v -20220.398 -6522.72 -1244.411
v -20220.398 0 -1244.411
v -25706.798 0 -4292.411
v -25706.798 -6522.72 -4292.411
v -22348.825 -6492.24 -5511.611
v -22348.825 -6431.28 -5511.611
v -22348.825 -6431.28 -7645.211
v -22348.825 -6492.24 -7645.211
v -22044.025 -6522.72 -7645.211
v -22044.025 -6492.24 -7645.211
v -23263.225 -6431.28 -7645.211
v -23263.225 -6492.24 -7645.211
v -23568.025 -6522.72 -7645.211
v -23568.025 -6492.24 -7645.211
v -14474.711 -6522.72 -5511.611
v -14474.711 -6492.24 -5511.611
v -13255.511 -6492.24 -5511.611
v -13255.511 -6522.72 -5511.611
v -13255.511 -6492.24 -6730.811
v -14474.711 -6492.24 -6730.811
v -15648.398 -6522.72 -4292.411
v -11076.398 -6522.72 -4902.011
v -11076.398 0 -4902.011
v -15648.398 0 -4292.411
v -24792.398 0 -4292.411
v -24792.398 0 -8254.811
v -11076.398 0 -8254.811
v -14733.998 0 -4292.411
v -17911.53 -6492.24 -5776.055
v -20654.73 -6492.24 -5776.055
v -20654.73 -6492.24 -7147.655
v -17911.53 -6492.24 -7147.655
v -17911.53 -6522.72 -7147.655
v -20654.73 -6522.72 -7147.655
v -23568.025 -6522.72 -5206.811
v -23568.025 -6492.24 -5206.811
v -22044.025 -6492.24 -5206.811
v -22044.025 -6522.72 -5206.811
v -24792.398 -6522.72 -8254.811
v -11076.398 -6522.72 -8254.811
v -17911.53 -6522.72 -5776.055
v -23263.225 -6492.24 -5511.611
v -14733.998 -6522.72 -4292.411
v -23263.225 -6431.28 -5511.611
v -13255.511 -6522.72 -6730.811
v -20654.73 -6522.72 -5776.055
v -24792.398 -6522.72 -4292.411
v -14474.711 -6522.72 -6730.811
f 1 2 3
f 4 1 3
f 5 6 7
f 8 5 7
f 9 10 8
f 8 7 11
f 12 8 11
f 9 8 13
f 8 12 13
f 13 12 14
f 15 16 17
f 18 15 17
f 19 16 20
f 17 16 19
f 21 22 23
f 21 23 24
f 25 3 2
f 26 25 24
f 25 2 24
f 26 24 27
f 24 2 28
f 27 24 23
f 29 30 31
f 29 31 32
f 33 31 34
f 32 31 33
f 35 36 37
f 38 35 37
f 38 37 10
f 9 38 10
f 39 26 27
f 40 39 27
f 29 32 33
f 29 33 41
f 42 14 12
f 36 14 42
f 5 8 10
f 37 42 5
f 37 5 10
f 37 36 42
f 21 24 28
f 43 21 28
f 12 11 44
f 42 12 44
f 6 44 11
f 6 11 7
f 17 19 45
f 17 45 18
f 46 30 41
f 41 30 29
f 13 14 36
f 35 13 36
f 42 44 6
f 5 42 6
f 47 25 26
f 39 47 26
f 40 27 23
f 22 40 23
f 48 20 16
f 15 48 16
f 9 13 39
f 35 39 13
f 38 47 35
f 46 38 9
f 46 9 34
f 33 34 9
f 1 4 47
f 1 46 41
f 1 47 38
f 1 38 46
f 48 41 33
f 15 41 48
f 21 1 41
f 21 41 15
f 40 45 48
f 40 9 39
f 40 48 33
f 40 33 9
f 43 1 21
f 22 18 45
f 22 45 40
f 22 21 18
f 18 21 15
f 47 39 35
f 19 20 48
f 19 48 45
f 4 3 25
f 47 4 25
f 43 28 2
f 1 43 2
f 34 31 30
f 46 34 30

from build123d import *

# Parameters (mm, degrees)
F0_W     = 4572
F0_H     = 609.6
F0_W_2   = 2743.2
F0_H_2   = 1371.6
F0_W_3   = 1219.2
F0_H_3   = 1219.2
F1_DEPTH = 6522.72
F0_W_4   = 914.4
F0_H_4   = 2133.6
F2_DEPTH = 6431.28
F3_DEPTH = 6492.24
F4_DEPTH = 6492.24
F5_DEPTH = 6492.24


with BuildPart() as f1:
    # F0 (on Front) → F1 (new body)
    with BuildSketch(Plane.XZ):
        Polygon((-24792.3976912726, -7645.2114713722), (-24792.3976912726, -8254.8114713722), (-15648.3976912726, -8254.8114713722), (-15648.3976912726, -7645.2114713722), (-22044.0248364636, -7645.2114713722), (-22348.8248364636, -7645.2114713722), (-23263.2248364636, -7645.2114713722), (-23568.0248364636, -7645.2114713722), align=None)
        with Locations((-13362.3976912726, -7950.0114713722)):
            Rectangle(F0_W, F0_H)
        Polygon((-24792.3976912726, -4292.4114713722), (-24792.3976912726, -7645.2114713722), (-23568.0248364636, -7645.2114713722), (-23568.0248364636, -5206.8114713722), (-23263.2248364636, -5206.8114713722), (-22044.0248364636, -5206.8114713722), (-22044.0248364636, -5511.6114713722), (-22044.0248364636, -7645.2114713722), (-15648.3976912726, -7645.2114713722), (-15648.3976912726, -4902.0114713722), (-15648.3976912726, -4292.4114713722), (-20220.3976912726, -4292.4114713722), align=None)
        with Locations((-19283.1299586484, -6461.8551946693)):
            Rectangle(F0_W_2, F0_H_2, mode=Mode.SUBTRACT)
        Polygon((-15648.3976912726, -4902.0114713722), (-15648.3976912726, -7645.2114713722), (-11076.3976912726, -7645.2114713722), (-11076.3976912726, -5601.1905130439), align=None)
        with Locations((-13865.1114181519, -6121.2114713722)):
            Rectangle(F0_W_3, F0_H_3, mode=Mode.SUBTRACT)
        Polygon((-20220.3976912726, -2006.4114713722), (-24792.3976912726, -4292.4114713722), (-20220.3976912726, -4292.4114713722), align=None)
        Polygon((-25706.7976912726, -4292.4114713722), (-24792.3976912726, -4292.4114713722), (-20220.3976912726, -2006.4114713722), (-20220.3976912726, -1244.4114713722), align=None)
        Polygon((-15648.3976912726, -4292.4114713722), (-15648.3976912726, -4902.0114713722), (-11076.3976912726, -5601.1905130439), (-11076.3976912726, -4902.0114713722), align=None)
        Polygon((-20220.3976912726, -2006.4114713722), (-20220.3976912726, -4292.4114713722), (-15648.3976912726, -4292.4114713722), align=None)
        Polygon((-20220.3976912726, -1244.4114713722), (-20220.3976912726, -2006.4114713722), (-15648.3976912726, -4292.4114713722), (-14733.9976912726, -4292.4114713722), align=None)
    extrude(amount=F1_DEPTH)

    # F0 (on Front) → F2 (join)
    with BuildSketch(Plane.XZ):
        with Locations((-22806.0248364636, -6578.4114713722)):
            Rectangle(F0_W_4, F0_H_4)
    extrude(amount=F2_DEPTH)

    # F0 (on Front) → F3 (join)
    with BuildSketch(Plane.XZ):
        Polygon((-23568.0248364636, -5206.8114713722), (-23568.0248364636, -7645.2114713722), (-23263.2248364636, -7645.2114713722), (-23263.2248364636, -5511.6114713722), (-22348.8248364636, -5511.6114713722), (-22348.8248364636, -7645.2114713722), (-22044.0248364636, -7645.2114713722), (-22044.0248364636, -5511.6114713722), (-22044.0248364636, -5206.8114713722), (-23263.2248364636, -5206.8114713722), align=None)
    extrude(amount=F3_DEPTH)

    # F0 (on Front) → F4 (join)
    with BuildSketch(Plane.XZ):
        with Locations((-19283.1299586484, -6461.8551946693)):
            Rectangle(F0_W_2, F0_H_2)
    extrude(amount=F4_DEPTH)

    # F0 (on Front) → F5 (join)
    with BuildSketch(Plane.XZ):
        with Locations((-13865.1114181519, -6121.2114713722)):
            Rectangle(F0_W_3, F0_H_3)
    extrude(amount=F5_DEPTH)


solid = f1.part
